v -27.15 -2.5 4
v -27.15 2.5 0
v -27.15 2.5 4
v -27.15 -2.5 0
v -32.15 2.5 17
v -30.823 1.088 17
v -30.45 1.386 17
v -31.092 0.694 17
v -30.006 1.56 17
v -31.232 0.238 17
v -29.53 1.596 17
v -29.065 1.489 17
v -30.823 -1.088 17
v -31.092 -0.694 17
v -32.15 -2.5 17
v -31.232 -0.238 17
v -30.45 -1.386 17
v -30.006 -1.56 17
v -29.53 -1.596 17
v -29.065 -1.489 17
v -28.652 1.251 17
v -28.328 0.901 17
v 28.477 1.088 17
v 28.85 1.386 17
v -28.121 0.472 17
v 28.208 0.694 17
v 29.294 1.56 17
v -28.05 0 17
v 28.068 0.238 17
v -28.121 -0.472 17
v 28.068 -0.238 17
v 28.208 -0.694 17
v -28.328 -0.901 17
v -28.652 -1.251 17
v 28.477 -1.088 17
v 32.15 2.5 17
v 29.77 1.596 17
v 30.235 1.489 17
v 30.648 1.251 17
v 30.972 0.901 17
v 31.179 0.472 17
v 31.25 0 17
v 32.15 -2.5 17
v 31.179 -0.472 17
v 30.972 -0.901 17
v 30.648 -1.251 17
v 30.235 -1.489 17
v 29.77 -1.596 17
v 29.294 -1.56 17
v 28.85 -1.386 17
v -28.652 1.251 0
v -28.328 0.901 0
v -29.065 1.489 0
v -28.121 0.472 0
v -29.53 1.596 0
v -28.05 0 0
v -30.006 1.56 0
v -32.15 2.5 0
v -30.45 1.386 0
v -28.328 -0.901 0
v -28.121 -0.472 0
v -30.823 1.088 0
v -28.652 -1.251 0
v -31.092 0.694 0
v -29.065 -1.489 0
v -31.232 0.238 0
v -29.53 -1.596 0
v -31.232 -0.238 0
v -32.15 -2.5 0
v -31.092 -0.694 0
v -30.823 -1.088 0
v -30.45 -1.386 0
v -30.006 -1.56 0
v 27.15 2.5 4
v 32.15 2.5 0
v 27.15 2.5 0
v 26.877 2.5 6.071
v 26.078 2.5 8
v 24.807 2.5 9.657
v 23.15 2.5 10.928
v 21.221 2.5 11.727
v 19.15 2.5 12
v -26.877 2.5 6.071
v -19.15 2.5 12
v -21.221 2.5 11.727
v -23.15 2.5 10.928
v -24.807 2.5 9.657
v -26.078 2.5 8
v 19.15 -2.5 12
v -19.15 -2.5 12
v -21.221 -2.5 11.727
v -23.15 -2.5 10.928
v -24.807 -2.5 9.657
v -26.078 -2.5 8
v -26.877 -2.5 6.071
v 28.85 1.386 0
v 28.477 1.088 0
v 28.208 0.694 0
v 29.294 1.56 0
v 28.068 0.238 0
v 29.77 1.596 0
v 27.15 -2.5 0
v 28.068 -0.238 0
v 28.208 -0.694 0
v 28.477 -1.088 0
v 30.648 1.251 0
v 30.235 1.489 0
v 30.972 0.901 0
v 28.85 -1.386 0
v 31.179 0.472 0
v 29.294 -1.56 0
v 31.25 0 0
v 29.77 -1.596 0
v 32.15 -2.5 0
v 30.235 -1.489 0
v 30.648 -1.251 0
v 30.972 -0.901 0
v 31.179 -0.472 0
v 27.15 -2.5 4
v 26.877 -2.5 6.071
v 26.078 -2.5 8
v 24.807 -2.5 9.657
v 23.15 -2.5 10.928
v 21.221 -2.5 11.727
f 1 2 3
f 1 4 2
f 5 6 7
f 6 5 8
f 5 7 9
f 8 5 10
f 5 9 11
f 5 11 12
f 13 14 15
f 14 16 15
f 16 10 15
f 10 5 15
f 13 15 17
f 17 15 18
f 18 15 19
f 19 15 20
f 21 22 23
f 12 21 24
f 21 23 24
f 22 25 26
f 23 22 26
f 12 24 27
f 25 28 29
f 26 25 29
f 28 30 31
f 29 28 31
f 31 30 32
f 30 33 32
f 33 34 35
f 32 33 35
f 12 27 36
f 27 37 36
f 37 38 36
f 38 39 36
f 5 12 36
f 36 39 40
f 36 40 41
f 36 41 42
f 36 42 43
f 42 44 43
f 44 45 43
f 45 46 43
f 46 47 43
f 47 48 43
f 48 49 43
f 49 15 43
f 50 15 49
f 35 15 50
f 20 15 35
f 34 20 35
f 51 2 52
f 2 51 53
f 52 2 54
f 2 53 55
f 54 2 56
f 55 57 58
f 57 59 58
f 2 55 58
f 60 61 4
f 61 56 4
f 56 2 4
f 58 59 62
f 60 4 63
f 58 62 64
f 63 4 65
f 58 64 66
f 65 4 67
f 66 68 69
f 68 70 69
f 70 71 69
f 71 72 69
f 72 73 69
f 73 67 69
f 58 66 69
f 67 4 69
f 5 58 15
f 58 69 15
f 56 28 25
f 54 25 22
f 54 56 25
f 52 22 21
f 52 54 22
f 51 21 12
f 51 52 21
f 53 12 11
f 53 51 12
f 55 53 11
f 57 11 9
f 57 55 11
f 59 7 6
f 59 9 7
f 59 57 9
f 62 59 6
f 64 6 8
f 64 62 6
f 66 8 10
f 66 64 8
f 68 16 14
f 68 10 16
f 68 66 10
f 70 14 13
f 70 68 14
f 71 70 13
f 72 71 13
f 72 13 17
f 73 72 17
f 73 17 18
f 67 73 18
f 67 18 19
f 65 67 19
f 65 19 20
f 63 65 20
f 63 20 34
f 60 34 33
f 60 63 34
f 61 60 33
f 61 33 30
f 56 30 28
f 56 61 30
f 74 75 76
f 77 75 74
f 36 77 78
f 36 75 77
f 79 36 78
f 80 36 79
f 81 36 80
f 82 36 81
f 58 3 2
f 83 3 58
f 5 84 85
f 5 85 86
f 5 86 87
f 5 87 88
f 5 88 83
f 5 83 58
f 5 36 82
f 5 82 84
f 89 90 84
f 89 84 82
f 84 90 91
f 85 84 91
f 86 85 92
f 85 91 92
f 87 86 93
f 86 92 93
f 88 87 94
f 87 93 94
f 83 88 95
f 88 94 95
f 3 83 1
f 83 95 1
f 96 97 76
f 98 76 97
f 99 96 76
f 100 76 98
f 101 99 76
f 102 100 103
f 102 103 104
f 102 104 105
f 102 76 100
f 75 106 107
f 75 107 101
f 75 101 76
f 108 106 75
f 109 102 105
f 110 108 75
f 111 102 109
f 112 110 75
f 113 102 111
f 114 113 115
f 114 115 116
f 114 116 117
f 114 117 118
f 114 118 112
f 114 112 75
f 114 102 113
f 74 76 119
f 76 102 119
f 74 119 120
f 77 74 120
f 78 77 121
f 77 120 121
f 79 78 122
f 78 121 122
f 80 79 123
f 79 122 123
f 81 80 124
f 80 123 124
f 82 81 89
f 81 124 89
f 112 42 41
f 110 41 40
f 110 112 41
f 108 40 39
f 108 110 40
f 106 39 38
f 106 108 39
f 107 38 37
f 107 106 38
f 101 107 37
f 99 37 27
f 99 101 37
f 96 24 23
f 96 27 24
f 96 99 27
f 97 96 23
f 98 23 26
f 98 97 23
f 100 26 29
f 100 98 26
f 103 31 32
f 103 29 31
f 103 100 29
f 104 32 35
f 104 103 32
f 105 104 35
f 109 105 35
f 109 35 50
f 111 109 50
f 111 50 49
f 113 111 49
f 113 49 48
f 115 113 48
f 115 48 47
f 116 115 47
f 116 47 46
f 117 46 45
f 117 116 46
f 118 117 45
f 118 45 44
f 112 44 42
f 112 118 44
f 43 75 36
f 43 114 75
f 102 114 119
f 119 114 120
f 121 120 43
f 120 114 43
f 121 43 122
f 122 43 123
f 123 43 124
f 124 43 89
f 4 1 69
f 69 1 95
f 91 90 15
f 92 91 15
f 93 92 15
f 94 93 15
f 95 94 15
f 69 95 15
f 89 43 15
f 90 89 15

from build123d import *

# Parameters (mm, degrees)
PAD_DEPTH    = 2.5
SKETCH001_R  = 1.6
POCKET_DEPTH = 17.001


with BuildPart() as part:
    # Sketch → Pad (new body, symmetric)
    with BuildSketch(Plane.XZ):
        with BuildLine():
            ThreePointArc((-19.15, 12), (-24.806854, 9.656854), (-27.15, 4))
            Line((-27.15, 0), (-27.15, 4))
            Line((-27.15, 0), (-32.15, 0))
            Line((-32.15, 0), (-32.15, 17))
            Line((-32.15, 17), (32.15, 17))
            Line((32.15, 0), (32.15, 17))
            Line((27.15, 0), (32.15, 0))
            Line((27.15, 0), (27.15, 4))
            ThreePointArc((27.15, 4), (24.806854, 9.656854), (19.15, 12))
            Line((-19.15, 12), (19.15, 12))
        make_face()
    extrude(amount=PAD_DEPTH, both=True)

    # Sketch001 → Pocket (cut, through all)
    with BuildSketch(Plane.XY):
        with Locations((-29.65, 0)):
            Circle(SKETCH001_R)
        with Locations((29.65, 0)):
            Circle(SKETCH001_R)
    extrude(amount=POCKET_DEPTH, mode=Mode.SUBTRACT)


solid = part.part
